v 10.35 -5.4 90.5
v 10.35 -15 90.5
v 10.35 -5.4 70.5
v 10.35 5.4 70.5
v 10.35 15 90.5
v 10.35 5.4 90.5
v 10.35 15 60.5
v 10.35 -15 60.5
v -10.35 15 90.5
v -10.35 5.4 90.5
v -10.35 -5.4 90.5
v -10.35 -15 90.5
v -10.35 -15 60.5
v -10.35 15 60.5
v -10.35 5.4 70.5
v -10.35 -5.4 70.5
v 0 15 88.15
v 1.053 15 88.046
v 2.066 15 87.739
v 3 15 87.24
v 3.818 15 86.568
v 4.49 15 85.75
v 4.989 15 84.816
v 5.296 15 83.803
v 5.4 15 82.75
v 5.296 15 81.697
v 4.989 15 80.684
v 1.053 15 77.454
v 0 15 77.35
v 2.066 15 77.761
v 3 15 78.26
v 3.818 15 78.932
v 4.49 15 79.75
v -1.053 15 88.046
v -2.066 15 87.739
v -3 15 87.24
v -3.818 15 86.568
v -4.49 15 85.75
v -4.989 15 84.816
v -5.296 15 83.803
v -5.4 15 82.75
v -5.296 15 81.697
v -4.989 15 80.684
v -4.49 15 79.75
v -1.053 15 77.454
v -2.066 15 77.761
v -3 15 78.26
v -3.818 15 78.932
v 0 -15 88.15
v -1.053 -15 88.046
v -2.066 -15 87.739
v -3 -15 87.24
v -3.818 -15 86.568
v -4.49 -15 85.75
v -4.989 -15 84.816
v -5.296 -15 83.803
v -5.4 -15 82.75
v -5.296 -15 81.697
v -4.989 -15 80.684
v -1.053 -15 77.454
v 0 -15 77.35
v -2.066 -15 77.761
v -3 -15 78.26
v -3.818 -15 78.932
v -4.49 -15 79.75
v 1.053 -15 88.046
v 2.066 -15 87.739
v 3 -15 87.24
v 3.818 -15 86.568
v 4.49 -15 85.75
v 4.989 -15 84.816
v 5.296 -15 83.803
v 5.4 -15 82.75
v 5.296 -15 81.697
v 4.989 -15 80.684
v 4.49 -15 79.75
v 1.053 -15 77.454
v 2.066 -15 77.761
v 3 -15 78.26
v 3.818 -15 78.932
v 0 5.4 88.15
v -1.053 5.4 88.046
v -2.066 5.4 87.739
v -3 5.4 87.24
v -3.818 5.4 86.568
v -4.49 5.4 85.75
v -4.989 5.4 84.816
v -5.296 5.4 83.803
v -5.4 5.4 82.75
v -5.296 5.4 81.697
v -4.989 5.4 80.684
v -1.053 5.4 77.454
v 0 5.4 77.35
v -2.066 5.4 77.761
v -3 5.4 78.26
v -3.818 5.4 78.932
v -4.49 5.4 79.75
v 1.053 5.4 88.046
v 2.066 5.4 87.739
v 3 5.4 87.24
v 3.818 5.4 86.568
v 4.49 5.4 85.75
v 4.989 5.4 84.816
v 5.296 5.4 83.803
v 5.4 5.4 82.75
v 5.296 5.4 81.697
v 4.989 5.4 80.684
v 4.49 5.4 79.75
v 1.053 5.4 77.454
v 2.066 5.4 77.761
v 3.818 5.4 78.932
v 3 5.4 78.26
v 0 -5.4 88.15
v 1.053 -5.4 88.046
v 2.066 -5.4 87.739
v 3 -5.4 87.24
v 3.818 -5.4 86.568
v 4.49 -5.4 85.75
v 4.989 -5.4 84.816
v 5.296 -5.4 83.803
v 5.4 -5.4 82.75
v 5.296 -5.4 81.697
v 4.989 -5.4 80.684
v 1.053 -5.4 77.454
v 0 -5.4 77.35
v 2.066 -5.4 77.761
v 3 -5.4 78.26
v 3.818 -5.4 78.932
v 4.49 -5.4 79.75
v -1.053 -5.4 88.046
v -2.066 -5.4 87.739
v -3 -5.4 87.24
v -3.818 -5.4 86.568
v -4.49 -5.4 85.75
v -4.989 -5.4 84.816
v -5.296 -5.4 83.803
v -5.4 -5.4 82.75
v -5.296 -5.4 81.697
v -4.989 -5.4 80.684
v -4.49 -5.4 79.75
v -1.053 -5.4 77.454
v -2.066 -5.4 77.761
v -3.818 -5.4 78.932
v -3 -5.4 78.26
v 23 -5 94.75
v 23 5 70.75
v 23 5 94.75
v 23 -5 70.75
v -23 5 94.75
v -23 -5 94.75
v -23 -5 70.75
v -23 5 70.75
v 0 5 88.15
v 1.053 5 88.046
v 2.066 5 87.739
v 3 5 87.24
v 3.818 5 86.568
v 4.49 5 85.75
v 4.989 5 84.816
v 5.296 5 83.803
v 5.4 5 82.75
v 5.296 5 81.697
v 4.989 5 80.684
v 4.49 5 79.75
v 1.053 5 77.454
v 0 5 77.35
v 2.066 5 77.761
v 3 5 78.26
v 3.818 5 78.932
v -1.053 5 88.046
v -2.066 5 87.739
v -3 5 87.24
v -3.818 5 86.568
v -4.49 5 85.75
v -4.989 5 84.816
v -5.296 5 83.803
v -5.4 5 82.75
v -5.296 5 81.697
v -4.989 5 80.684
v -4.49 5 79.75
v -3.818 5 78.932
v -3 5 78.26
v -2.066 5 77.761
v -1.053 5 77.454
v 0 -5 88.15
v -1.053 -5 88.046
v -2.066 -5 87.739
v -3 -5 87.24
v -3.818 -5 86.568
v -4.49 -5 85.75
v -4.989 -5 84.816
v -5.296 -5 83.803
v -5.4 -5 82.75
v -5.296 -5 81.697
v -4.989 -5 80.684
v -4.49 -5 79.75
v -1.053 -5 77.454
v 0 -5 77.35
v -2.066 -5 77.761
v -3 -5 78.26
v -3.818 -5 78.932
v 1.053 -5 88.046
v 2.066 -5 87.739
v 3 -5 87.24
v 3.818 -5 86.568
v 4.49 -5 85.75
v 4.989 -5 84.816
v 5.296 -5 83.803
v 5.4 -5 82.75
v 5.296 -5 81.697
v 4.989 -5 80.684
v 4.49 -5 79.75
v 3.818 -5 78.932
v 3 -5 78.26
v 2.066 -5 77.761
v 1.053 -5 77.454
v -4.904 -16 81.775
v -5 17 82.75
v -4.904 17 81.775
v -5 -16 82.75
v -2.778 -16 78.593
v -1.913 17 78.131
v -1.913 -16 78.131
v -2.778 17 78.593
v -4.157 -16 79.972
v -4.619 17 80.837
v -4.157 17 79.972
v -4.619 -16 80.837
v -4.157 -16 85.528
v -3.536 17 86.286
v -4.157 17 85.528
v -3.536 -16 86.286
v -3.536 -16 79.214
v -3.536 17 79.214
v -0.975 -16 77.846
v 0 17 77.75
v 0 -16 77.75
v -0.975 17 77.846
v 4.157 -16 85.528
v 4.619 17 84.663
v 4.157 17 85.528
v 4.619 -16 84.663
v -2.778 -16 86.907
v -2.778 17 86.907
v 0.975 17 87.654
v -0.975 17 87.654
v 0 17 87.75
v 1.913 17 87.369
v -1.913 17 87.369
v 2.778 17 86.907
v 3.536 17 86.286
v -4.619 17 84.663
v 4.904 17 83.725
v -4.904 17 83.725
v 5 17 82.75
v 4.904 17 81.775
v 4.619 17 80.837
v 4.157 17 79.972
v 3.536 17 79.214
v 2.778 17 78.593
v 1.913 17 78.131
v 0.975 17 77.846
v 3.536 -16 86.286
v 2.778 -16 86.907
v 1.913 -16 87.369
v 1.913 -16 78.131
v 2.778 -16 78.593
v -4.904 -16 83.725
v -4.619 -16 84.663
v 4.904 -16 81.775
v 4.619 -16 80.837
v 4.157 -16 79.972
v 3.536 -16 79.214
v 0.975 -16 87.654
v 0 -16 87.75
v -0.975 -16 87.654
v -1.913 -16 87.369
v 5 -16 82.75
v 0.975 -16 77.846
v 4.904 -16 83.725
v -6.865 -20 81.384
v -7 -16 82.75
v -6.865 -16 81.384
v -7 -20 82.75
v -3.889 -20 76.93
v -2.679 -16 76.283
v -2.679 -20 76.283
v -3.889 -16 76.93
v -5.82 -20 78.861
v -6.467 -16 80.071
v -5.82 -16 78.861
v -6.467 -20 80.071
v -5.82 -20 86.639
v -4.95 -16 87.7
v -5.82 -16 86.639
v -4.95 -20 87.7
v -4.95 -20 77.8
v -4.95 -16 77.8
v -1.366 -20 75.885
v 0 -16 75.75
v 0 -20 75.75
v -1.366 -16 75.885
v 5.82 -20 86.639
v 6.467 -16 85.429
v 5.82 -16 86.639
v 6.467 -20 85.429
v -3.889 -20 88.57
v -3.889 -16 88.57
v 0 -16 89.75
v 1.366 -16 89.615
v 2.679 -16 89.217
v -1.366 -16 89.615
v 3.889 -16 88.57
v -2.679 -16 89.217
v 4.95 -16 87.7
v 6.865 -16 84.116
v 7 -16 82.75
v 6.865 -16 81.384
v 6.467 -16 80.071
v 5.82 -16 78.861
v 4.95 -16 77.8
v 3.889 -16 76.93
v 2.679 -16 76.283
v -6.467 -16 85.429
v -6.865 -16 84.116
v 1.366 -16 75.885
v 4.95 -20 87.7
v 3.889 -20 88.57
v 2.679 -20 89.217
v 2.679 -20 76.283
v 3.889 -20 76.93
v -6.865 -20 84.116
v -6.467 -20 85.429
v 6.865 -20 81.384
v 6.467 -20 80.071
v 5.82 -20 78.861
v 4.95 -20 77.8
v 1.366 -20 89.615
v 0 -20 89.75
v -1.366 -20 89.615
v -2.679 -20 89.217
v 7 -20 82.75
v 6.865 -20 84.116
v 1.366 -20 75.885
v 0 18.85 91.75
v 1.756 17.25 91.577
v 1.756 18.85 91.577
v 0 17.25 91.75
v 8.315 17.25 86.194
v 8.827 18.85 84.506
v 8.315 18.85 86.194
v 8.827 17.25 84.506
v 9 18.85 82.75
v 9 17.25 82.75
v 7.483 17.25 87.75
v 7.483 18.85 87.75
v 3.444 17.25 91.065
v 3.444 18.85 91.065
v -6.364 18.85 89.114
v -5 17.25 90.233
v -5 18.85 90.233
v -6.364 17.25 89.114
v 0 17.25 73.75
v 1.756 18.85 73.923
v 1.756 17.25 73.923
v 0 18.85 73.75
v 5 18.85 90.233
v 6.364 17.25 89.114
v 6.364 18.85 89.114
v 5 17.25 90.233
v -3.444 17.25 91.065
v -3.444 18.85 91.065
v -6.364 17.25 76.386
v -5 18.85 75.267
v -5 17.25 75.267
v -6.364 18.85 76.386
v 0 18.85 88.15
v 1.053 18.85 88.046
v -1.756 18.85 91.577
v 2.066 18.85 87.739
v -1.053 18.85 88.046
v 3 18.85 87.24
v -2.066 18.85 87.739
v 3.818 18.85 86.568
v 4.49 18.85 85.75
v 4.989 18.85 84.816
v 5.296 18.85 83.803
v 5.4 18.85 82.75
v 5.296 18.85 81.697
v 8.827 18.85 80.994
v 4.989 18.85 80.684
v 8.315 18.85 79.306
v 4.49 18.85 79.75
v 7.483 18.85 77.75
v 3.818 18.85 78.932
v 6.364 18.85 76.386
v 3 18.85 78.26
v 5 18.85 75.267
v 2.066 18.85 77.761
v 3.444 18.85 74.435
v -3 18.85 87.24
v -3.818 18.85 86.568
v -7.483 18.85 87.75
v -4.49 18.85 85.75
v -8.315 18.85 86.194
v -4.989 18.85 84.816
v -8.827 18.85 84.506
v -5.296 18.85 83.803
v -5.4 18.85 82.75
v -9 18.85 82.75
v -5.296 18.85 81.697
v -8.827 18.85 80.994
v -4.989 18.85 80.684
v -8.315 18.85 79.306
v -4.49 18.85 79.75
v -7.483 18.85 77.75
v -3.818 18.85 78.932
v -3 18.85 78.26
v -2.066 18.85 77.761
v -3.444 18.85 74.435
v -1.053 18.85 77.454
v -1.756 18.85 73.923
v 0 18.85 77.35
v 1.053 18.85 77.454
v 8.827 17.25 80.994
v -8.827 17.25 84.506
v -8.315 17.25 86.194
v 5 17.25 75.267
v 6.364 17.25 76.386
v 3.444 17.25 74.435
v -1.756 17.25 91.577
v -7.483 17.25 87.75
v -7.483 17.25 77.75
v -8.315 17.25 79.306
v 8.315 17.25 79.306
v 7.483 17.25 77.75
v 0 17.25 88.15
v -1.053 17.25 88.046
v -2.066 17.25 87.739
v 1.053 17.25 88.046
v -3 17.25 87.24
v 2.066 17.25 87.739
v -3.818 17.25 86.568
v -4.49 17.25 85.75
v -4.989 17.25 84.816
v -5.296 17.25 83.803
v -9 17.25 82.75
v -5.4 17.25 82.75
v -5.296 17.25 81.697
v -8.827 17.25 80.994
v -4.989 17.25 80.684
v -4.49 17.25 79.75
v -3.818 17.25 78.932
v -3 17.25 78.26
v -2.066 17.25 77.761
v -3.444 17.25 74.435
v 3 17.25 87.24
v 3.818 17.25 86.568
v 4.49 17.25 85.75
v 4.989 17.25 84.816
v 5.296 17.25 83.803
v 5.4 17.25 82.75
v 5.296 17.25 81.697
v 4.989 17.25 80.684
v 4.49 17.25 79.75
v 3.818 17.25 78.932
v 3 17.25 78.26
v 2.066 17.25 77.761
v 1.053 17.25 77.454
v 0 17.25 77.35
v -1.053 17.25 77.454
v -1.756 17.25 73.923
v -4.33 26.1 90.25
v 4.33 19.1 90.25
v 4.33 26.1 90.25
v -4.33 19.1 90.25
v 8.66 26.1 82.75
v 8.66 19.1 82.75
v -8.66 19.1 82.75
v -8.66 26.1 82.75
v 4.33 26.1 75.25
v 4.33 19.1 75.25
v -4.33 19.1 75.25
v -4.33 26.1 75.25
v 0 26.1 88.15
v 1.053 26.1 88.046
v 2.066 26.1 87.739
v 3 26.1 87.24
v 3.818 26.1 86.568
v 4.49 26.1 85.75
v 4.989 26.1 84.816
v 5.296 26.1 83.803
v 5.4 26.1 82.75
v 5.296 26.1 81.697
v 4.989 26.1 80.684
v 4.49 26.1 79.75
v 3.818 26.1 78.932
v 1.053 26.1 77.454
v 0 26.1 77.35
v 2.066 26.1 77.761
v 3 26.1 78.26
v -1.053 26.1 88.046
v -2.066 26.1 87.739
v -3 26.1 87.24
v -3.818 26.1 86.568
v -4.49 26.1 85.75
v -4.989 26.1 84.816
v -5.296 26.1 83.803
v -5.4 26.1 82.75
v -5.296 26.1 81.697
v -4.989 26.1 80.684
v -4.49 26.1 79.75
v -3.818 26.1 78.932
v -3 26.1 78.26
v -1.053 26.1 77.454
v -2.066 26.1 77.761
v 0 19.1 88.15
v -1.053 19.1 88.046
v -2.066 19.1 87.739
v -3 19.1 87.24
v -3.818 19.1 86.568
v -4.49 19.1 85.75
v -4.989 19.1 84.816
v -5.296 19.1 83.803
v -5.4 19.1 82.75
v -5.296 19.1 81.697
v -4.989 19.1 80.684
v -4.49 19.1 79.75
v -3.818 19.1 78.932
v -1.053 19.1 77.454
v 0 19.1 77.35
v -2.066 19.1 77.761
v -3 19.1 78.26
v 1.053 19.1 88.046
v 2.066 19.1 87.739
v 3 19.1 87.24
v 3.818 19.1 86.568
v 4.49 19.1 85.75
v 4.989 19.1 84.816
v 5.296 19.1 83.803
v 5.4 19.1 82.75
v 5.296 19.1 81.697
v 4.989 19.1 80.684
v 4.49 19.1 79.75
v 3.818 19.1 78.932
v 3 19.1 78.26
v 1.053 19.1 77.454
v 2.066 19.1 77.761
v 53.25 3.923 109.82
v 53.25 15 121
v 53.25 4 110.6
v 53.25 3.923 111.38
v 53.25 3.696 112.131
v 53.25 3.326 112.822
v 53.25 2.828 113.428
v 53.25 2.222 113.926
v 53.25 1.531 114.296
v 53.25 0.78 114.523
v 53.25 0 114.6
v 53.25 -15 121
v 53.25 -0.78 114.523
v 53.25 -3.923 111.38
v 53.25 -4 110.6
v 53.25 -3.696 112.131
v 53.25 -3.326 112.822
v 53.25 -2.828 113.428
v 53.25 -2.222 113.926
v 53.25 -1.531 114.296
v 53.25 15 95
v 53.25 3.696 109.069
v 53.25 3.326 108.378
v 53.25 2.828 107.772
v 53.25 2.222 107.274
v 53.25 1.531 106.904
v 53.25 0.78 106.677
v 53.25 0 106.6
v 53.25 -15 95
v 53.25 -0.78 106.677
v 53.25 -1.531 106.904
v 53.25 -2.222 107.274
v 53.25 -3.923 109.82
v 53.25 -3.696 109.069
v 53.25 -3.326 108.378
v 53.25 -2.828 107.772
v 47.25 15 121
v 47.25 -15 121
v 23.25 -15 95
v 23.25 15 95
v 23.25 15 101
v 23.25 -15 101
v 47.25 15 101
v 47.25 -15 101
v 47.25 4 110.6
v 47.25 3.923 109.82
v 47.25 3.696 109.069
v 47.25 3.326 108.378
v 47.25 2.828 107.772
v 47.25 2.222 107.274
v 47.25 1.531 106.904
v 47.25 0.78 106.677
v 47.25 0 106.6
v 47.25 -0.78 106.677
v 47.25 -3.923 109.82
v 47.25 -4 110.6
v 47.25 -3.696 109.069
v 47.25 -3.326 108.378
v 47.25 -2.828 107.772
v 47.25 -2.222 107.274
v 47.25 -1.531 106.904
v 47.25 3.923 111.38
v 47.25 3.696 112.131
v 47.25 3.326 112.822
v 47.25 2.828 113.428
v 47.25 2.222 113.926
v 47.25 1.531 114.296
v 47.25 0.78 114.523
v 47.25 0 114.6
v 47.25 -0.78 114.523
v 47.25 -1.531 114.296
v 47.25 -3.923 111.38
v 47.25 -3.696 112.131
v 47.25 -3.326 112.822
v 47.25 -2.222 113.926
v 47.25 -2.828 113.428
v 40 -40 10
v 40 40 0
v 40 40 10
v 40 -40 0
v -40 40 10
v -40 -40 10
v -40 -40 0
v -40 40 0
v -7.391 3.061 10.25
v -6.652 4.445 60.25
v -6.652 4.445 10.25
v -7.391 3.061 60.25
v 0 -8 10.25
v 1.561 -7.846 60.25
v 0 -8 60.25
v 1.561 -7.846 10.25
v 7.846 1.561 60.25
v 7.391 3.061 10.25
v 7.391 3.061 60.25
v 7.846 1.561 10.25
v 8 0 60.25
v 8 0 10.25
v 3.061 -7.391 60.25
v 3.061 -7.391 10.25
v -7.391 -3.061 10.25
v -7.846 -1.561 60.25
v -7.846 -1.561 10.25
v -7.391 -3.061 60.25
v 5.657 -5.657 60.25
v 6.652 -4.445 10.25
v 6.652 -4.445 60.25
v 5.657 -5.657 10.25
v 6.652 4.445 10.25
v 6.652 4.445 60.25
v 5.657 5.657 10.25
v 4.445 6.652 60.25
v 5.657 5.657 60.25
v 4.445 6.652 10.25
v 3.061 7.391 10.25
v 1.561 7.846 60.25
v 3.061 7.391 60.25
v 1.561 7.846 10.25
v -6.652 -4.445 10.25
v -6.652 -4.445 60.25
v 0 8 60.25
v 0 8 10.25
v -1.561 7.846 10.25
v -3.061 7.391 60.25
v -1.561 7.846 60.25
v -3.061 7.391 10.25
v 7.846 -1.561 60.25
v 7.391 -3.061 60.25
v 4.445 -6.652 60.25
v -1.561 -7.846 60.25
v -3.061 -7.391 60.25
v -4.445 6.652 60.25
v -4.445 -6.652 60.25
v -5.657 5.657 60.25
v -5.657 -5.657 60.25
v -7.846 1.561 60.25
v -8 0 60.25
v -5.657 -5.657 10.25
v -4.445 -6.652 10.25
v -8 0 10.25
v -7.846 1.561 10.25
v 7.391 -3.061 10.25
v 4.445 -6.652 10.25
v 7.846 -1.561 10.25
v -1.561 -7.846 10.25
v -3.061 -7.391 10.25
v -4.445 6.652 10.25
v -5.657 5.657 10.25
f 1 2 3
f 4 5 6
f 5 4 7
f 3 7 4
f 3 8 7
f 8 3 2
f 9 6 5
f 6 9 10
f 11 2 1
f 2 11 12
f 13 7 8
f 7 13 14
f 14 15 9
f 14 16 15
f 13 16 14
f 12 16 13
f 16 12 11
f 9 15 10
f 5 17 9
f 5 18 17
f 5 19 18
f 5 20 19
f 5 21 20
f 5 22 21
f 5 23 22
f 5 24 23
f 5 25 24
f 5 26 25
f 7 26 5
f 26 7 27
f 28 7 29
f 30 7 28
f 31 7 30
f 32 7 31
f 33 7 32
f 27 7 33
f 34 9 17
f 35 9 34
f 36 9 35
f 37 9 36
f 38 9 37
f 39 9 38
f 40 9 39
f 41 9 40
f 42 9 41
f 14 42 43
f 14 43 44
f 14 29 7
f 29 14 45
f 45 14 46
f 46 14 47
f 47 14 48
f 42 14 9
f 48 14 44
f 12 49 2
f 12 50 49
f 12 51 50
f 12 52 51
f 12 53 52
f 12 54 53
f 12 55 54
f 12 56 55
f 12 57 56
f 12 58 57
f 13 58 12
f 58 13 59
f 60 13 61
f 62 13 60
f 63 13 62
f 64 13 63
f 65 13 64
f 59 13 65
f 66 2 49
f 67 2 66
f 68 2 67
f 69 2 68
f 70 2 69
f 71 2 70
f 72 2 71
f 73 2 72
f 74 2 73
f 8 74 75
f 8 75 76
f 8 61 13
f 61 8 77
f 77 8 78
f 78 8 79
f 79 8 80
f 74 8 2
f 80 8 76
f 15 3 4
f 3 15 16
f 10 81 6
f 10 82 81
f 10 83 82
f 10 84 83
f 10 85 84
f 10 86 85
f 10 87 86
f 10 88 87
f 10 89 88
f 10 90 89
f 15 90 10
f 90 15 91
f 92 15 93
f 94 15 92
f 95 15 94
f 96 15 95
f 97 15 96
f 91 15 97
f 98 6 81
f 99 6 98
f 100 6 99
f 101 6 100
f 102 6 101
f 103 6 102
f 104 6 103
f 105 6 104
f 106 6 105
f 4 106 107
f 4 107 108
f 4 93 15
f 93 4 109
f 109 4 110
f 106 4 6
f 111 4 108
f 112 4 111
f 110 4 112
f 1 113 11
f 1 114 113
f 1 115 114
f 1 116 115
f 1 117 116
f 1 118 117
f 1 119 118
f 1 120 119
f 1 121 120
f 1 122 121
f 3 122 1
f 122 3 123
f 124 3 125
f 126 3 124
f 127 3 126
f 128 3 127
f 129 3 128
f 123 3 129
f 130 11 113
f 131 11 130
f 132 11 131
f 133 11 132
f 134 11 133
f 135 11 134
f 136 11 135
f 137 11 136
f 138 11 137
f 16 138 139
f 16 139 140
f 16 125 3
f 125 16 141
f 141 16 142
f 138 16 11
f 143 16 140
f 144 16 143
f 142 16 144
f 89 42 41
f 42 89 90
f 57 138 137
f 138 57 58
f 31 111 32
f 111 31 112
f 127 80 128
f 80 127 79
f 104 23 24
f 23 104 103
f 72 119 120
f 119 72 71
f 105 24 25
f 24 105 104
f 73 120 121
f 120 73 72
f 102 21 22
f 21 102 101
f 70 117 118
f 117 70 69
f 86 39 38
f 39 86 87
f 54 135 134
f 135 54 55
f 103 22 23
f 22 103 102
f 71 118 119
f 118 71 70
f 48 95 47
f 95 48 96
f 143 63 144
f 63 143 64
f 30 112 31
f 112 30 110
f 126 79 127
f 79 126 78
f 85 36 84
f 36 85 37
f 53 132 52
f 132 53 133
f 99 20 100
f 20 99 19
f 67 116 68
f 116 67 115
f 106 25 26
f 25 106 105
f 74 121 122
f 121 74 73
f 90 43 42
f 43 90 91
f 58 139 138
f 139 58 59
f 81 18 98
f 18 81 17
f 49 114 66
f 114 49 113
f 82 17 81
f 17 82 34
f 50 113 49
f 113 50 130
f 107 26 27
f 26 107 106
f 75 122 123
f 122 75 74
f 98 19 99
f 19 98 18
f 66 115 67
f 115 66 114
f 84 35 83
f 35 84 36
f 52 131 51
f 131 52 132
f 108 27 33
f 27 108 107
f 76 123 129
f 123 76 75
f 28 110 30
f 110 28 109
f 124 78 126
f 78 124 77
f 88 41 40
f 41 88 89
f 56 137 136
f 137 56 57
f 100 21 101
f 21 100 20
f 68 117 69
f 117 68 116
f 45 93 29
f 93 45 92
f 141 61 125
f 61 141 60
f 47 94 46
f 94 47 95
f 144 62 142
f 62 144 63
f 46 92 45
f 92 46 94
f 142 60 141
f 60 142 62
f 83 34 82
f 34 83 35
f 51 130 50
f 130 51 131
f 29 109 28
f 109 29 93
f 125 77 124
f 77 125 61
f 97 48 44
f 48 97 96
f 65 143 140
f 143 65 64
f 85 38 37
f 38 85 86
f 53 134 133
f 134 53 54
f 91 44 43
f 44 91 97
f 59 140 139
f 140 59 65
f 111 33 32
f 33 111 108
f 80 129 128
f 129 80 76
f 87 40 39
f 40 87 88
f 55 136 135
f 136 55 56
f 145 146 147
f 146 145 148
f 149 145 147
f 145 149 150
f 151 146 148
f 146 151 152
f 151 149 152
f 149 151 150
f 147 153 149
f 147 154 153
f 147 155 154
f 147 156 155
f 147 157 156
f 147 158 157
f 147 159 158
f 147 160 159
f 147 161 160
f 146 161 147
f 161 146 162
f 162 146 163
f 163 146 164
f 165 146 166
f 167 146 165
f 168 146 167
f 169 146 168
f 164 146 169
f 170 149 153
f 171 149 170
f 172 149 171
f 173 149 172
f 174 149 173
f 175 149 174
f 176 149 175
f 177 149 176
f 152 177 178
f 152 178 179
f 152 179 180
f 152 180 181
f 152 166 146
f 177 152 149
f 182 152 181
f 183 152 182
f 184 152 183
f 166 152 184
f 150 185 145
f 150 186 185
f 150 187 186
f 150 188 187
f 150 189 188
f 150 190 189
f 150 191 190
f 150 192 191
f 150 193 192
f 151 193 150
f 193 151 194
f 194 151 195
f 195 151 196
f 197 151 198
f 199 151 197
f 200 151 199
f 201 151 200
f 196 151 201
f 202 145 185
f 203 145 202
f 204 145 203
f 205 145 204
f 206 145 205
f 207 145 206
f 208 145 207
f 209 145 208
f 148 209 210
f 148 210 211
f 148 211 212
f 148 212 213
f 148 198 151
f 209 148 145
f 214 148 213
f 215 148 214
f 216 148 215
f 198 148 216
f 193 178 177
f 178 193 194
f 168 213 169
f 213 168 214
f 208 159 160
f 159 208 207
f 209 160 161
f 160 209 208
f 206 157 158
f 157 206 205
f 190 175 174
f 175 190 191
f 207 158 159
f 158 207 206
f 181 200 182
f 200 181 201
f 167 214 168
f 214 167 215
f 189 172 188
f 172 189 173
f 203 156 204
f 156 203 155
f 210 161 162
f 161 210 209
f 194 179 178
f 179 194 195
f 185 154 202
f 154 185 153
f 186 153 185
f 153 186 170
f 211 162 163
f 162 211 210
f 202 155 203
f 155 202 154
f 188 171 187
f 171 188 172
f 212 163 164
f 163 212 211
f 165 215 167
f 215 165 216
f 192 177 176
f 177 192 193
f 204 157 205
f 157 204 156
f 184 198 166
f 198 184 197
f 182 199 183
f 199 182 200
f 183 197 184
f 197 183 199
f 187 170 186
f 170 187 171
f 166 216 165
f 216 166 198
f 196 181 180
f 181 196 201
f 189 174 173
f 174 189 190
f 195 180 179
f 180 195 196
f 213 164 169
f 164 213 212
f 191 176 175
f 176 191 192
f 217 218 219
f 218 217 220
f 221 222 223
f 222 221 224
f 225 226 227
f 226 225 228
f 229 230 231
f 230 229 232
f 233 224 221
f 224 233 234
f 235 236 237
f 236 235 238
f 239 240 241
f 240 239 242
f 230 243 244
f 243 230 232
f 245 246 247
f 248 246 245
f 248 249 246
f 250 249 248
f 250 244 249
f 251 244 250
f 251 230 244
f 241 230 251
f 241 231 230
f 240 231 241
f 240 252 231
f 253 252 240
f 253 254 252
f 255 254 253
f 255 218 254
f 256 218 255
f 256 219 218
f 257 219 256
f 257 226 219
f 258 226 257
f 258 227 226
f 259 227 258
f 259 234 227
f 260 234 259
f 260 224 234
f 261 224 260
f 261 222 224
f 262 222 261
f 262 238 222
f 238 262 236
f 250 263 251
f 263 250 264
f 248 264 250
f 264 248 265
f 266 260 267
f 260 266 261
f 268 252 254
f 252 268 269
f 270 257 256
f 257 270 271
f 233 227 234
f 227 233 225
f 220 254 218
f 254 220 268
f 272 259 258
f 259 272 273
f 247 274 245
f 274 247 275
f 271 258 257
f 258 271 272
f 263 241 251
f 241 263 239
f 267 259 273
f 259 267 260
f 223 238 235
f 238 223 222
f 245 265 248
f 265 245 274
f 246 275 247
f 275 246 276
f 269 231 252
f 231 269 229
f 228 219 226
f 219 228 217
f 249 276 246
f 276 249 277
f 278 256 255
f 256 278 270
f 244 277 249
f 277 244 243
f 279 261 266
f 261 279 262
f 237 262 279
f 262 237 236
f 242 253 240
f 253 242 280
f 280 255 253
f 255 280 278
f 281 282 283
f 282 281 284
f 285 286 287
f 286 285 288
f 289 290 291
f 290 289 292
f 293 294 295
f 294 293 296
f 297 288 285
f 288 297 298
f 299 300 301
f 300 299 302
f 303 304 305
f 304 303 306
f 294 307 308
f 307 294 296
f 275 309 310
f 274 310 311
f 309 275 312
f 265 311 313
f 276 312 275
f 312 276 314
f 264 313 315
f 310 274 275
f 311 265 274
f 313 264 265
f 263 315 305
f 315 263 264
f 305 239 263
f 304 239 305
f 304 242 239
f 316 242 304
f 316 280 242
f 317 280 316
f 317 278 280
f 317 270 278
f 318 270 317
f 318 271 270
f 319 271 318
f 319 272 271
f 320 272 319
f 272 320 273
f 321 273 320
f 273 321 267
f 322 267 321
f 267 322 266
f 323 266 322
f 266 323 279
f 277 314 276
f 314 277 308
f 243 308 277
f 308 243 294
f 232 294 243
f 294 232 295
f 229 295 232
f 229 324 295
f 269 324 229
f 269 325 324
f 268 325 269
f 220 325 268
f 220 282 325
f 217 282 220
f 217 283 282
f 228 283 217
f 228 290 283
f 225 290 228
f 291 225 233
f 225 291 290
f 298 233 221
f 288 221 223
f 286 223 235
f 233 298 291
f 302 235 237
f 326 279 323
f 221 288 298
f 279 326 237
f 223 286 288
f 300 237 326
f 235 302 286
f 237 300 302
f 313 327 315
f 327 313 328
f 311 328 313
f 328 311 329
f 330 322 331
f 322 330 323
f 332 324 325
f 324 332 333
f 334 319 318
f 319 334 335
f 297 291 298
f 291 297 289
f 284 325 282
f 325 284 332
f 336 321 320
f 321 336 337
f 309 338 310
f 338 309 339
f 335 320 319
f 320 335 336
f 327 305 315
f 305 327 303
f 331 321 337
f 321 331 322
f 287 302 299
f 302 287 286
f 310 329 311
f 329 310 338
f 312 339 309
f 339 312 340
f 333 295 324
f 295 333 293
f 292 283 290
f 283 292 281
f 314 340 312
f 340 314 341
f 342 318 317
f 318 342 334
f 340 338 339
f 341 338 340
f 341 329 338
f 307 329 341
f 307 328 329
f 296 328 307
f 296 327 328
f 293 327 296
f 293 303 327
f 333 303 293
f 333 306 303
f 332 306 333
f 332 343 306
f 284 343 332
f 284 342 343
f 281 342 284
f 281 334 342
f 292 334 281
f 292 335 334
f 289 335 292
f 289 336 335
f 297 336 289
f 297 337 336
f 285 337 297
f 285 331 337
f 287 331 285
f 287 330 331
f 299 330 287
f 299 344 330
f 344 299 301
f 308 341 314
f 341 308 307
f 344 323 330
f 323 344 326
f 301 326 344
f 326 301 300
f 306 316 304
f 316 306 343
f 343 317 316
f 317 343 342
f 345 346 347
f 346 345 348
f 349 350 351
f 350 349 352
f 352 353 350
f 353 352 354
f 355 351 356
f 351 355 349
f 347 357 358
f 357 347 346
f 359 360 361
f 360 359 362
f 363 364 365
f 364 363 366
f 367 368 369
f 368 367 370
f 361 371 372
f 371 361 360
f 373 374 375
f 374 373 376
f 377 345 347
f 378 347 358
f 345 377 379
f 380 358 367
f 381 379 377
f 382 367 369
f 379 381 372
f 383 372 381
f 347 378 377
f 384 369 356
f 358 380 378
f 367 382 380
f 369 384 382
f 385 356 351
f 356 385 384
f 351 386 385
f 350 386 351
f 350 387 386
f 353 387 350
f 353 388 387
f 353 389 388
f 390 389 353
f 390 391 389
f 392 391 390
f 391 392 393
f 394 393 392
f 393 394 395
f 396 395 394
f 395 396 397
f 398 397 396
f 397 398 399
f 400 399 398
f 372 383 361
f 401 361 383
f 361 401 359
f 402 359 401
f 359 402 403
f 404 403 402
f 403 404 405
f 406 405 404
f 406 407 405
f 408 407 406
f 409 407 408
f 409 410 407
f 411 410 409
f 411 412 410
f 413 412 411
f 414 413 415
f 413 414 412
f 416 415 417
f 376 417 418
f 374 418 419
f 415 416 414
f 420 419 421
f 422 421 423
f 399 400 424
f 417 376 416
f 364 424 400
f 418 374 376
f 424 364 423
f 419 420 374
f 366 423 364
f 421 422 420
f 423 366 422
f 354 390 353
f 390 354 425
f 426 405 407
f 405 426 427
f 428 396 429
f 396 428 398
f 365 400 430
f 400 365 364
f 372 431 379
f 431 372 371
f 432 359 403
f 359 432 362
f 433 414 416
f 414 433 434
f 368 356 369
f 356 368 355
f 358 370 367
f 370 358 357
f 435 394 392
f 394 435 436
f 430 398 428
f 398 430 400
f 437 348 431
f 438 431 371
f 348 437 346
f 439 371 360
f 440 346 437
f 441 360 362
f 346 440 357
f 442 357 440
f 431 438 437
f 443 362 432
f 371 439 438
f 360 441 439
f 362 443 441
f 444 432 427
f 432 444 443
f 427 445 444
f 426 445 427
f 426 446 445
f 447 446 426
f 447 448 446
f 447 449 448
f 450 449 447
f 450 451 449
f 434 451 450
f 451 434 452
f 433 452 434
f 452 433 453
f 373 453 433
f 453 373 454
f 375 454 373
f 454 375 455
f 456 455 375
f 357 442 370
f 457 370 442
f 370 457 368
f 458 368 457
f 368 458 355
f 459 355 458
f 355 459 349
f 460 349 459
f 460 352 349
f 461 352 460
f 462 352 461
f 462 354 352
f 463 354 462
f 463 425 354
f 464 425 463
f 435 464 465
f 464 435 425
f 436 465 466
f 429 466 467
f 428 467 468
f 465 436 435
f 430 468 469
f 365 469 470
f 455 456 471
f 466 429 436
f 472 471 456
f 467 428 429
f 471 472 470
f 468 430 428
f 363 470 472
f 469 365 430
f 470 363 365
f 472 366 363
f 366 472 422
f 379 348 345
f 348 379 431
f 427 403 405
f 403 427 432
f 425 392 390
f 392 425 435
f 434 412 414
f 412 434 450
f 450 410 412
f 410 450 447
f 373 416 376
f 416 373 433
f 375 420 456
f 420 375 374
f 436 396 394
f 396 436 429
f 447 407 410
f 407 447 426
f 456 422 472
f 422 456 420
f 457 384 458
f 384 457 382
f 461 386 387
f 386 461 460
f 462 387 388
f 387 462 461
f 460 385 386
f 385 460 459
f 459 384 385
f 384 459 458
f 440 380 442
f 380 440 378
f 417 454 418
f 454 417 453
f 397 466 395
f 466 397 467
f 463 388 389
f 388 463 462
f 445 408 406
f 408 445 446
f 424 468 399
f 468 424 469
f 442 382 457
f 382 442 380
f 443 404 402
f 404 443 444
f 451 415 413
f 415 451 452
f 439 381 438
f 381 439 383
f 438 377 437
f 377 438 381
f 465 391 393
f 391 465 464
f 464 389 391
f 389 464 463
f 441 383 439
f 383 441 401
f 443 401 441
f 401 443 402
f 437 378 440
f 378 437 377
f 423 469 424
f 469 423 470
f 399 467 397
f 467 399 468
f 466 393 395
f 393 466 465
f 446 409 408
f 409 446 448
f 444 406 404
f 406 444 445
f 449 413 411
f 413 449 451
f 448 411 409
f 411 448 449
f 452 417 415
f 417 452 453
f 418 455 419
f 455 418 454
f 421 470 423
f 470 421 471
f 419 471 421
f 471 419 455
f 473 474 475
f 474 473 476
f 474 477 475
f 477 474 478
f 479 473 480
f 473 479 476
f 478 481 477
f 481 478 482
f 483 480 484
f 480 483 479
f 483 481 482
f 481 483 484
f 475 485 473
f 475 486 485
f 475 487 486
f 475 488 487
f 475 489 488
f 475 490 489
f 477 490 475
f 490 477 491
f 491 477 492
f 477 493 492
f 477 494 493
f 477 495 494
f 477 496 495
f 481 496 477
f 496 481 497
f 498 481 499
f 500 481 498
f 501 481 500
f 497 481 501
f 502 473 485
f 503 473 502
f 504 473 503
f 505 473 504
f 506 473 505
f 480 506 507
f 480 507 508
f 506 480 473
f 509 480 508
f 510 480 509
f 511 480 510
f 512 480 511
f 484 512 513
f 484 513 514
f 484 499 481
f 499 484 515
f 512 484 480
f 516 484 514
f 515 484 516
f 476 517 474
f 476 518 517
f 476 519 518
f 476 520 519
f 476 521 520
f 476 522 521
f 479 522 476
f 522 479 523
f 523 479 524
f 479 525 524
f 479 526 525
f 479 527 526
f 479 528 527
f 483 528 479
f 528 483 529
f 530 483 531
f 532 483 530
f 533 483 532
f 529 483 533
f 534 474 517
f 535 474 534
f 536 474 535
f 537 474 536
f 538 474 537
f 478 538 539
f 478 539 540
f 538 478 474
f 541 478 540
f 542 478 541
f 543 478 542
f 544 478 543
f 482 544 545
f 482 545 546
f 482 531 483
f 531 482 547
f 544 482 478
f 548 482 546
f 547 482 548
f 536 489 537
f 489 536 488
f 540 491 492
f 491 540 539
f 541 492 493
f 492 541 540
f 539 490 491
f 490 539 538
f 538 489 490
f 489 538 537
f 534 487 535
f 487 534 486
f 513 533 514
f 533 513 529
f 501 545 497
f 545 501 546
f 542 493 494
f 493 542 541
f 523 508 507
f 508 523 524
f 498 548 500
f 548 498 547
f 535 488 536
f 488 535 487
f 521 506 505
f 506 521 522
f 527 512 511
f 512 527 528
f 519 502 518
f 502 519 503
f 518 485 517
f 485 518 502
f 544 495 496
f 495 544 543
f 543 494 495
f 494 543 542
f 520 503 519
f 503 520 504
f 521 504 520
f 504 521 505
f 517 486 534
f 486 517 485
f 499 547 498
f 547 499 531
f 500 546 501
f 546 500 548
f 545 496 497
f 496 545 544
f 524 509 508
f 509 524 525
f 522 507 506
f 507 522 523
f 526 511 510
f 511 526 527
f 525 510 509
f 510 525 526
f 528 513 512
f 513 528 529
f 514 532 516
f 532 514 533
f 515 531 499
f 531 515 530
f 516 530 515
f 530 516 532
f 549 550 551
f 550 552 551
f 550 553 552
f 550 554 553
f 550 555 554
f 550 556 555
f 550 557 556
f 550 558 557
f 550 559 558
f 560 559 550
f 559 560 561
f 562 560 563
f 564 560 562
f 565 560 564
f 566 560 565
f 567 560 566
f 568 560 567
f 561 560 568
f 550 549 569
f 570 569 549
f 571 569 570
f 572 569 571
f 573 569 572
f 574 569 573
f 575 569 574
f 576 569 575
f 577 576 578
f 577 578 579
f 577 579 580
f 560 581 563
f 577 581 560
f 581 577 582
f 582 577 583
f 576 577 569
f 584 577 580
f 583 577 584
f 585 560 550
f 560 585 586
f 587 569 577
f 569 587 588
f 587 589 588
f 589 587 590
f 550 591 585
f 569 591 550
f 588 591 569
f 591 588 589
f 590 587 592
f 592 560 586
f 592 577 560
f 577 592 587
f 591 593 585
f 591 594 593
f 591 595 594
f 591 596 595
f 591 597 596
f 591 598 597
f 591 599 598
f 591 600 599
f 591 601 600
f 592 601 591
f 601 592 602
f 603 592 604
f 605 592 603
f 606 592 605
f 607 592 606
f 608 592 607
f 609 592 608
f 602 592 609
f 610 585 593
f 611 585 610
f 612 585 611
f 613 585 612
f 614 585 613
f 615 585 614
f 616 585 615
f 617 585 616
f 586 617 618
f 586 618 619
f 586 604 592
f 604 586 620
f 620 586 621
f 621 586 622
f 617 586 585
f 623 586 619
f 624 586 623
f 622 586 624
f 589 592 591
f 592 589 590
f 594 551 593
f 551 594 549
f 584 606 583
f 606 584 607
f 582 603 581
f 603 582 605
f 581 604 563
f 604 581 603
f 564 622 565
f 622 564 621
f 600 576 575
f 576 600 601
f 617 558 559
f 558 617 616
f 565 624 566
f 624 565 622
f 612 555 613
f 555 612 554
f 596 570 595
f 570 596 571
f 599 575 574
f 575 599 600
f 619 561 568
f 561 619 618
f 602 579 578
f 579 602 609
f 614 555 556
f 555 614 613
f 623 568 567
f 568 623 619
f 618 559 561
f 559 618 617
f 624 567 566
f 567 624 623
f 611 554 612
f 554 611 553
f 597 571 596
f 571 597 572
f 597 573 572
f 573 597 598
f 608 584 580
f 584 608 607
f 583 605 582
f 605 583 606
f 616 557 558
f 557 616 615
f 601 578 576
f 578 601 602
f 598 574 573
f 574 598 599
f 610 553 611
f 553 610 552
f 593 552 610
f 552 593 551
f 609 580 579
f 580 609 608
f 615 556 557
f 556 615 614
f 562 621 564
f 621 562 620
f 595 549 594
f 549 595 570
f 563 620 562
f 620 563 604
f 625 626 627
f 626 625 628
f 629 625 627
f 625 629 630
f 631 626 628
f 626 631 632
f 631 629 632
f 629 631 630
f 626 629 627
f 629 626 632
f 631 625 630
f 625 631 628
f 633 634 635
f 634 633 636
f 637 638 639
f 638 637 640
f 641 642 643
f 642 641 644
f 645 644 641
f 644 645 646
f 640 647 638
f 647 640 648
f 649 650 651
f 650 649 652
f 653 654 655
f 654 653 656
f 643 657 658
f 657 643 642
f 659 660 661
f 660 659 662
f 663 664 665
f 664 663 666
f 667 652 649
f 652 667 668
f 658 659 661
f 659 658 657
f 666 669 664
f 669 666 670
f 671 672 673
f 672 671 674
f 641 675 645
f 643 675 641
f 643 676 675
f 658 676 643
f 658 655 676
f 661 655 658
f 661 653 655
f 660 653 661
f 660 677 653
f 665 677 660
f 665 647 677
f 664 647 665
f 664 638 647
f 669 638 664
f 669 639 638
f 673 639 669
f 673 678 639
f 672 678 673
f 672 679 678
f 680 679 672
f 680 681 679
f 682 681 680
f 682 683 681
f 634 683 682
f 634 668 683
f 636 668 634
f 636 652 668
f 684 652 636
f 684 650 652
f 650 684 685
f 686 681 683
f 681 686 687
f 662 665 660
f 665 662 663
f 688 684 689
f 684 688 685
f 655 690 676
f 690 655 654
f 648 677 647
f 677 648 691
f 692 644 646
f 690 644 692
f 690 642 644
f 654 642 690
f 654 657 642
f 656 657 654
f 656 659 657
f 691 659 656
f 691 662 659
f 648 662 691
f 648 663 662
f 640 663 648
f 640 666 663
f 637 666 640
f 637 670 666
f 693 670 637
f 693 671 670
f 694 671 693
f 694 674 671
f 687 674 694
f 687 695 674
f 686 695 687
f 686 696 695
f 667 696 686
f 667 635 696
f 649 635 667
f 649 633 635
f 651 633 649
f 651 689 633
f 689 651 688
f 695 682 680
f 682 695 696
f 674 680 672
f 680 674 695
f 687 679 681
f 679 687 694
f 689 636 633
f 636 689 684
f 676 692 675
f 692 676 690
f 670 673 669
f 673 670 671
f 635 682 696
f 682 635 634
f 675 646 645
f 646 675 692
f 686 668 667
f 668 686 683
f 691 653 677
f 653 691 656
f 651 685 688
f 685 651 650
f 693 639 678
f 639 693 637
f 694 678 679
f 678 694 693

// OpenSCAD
$fn = 32;

// ------------------------------------------------------------------------
// Lamp arm: column d16 x 50 mm, arm 46 mm
// Every part is its own module, assembly() places every instance.
// ------------------------------------------------------------------------

// --- part 1 ---
module lamp_base() {
  difference() {
    translate([-40, -40, 0]) cube([80, 80, 10]);
  }
}

// --- part 2 ---
module lamp_column() {
  cylinder(h = 50, d = 16);
}

// --- part 3 ---
module head_fork() {
  difference() {
    translate([-10.35, -15, 0]) cube([20.7, 30, 30]);
    translate([-11.35, -5.4, 10]) cube([22.7, 10.8, 21]);
    translate([0, 0, 22.25]) rotate([90, 0, 0]) cylinder(h = 32, d = 10.8, center = true);
  }
}

// --- part 4 ---
module lamp_arm() {
  difference() {
    translate([-23, -5, 0]) cube([46, 10, 24]);
    translate([0, 0, 12]) rotate([90, 0, 0]) cylinder(h = 12, d = 10.8, center = true);
  }
}

// --- part 5 ---
module arm_pin() {
  rotate([0, 90, 0]) cylinder(h = 34, d = 10, center = true);
  translate([-20, 0, 0]) rotate([0, 90, 0]) cylinder(h = 4, d = 14);
}

// --- part 6 ---
module arm_washer() {
  difference() {
      translate([0, 0, 0]) cylinder(h = 1.6, d = 18);
      translate([0, 0, -1]) cylinder(h = 3.6, d = 10.8);
    }
}

// --- part 7 ---
module arm_nut() {
  difference() {
    linear_extrude(height = 7) polygon(points = [[8.66, 0], [4.33, 7.5], [-4.33, 7.5], [-8.66, 0], [-4.33, -7.5], [4.33, -7.5]]);
    translate([0, 0, -1]) cylinder(h = 9, d = 10.8);
  }
}

// --- part 8 ---
module shade_bracket() {
  difference() {
    translate([-15, -15, 0]) cube([30, 30, 26]);
    translate([-16, -16, 6]) cube([25, 32, 21]);
    translate([12, 0, 15.6]) rotate([0, 90, 0]) cylinder(h = 8, d = 8, center = true);
  }
}

// --- assembly ---
module assembly() {
  color([0.80, 0.24, 0.20]) translate([0, 0, 0]) rotate([0, 0, 0]) lamp_base();
  color([0.20, 0.45, 0.75]) translate([0, 0, 10.25]) rotate([0, 0, 0]) lamp_column();
  color([0.25, 0.62, 0.32]) translate([0, 0, 60.5]) rotate([0, 0, 0]) head_fork();
  color([0.92, 0.70, 0.18]) translate([0, 0, 70.75]) rotate([0, 0, 0]) lamp_arm();
  color([0.58, 0.35, 0.70]) translate([0, 0, 82.75]) rotate([0, 0, 90]) arm_pin();
  color([0.16, 0.66, 0.66]) translate([0, 18.85, 82.75]) rotate([90, 0, 0]) arm_washer();
  color([0.85, 0.48, 0.18]) translate([0, 26.1, 82.75]) rotate([90, 0, 0]) arm_nut();
  color([0.55, 0.60, 0.65]) translate([38.25, 0, 95]) rotate([0, 0, 0]) shade_bracket();
}

assembly();
